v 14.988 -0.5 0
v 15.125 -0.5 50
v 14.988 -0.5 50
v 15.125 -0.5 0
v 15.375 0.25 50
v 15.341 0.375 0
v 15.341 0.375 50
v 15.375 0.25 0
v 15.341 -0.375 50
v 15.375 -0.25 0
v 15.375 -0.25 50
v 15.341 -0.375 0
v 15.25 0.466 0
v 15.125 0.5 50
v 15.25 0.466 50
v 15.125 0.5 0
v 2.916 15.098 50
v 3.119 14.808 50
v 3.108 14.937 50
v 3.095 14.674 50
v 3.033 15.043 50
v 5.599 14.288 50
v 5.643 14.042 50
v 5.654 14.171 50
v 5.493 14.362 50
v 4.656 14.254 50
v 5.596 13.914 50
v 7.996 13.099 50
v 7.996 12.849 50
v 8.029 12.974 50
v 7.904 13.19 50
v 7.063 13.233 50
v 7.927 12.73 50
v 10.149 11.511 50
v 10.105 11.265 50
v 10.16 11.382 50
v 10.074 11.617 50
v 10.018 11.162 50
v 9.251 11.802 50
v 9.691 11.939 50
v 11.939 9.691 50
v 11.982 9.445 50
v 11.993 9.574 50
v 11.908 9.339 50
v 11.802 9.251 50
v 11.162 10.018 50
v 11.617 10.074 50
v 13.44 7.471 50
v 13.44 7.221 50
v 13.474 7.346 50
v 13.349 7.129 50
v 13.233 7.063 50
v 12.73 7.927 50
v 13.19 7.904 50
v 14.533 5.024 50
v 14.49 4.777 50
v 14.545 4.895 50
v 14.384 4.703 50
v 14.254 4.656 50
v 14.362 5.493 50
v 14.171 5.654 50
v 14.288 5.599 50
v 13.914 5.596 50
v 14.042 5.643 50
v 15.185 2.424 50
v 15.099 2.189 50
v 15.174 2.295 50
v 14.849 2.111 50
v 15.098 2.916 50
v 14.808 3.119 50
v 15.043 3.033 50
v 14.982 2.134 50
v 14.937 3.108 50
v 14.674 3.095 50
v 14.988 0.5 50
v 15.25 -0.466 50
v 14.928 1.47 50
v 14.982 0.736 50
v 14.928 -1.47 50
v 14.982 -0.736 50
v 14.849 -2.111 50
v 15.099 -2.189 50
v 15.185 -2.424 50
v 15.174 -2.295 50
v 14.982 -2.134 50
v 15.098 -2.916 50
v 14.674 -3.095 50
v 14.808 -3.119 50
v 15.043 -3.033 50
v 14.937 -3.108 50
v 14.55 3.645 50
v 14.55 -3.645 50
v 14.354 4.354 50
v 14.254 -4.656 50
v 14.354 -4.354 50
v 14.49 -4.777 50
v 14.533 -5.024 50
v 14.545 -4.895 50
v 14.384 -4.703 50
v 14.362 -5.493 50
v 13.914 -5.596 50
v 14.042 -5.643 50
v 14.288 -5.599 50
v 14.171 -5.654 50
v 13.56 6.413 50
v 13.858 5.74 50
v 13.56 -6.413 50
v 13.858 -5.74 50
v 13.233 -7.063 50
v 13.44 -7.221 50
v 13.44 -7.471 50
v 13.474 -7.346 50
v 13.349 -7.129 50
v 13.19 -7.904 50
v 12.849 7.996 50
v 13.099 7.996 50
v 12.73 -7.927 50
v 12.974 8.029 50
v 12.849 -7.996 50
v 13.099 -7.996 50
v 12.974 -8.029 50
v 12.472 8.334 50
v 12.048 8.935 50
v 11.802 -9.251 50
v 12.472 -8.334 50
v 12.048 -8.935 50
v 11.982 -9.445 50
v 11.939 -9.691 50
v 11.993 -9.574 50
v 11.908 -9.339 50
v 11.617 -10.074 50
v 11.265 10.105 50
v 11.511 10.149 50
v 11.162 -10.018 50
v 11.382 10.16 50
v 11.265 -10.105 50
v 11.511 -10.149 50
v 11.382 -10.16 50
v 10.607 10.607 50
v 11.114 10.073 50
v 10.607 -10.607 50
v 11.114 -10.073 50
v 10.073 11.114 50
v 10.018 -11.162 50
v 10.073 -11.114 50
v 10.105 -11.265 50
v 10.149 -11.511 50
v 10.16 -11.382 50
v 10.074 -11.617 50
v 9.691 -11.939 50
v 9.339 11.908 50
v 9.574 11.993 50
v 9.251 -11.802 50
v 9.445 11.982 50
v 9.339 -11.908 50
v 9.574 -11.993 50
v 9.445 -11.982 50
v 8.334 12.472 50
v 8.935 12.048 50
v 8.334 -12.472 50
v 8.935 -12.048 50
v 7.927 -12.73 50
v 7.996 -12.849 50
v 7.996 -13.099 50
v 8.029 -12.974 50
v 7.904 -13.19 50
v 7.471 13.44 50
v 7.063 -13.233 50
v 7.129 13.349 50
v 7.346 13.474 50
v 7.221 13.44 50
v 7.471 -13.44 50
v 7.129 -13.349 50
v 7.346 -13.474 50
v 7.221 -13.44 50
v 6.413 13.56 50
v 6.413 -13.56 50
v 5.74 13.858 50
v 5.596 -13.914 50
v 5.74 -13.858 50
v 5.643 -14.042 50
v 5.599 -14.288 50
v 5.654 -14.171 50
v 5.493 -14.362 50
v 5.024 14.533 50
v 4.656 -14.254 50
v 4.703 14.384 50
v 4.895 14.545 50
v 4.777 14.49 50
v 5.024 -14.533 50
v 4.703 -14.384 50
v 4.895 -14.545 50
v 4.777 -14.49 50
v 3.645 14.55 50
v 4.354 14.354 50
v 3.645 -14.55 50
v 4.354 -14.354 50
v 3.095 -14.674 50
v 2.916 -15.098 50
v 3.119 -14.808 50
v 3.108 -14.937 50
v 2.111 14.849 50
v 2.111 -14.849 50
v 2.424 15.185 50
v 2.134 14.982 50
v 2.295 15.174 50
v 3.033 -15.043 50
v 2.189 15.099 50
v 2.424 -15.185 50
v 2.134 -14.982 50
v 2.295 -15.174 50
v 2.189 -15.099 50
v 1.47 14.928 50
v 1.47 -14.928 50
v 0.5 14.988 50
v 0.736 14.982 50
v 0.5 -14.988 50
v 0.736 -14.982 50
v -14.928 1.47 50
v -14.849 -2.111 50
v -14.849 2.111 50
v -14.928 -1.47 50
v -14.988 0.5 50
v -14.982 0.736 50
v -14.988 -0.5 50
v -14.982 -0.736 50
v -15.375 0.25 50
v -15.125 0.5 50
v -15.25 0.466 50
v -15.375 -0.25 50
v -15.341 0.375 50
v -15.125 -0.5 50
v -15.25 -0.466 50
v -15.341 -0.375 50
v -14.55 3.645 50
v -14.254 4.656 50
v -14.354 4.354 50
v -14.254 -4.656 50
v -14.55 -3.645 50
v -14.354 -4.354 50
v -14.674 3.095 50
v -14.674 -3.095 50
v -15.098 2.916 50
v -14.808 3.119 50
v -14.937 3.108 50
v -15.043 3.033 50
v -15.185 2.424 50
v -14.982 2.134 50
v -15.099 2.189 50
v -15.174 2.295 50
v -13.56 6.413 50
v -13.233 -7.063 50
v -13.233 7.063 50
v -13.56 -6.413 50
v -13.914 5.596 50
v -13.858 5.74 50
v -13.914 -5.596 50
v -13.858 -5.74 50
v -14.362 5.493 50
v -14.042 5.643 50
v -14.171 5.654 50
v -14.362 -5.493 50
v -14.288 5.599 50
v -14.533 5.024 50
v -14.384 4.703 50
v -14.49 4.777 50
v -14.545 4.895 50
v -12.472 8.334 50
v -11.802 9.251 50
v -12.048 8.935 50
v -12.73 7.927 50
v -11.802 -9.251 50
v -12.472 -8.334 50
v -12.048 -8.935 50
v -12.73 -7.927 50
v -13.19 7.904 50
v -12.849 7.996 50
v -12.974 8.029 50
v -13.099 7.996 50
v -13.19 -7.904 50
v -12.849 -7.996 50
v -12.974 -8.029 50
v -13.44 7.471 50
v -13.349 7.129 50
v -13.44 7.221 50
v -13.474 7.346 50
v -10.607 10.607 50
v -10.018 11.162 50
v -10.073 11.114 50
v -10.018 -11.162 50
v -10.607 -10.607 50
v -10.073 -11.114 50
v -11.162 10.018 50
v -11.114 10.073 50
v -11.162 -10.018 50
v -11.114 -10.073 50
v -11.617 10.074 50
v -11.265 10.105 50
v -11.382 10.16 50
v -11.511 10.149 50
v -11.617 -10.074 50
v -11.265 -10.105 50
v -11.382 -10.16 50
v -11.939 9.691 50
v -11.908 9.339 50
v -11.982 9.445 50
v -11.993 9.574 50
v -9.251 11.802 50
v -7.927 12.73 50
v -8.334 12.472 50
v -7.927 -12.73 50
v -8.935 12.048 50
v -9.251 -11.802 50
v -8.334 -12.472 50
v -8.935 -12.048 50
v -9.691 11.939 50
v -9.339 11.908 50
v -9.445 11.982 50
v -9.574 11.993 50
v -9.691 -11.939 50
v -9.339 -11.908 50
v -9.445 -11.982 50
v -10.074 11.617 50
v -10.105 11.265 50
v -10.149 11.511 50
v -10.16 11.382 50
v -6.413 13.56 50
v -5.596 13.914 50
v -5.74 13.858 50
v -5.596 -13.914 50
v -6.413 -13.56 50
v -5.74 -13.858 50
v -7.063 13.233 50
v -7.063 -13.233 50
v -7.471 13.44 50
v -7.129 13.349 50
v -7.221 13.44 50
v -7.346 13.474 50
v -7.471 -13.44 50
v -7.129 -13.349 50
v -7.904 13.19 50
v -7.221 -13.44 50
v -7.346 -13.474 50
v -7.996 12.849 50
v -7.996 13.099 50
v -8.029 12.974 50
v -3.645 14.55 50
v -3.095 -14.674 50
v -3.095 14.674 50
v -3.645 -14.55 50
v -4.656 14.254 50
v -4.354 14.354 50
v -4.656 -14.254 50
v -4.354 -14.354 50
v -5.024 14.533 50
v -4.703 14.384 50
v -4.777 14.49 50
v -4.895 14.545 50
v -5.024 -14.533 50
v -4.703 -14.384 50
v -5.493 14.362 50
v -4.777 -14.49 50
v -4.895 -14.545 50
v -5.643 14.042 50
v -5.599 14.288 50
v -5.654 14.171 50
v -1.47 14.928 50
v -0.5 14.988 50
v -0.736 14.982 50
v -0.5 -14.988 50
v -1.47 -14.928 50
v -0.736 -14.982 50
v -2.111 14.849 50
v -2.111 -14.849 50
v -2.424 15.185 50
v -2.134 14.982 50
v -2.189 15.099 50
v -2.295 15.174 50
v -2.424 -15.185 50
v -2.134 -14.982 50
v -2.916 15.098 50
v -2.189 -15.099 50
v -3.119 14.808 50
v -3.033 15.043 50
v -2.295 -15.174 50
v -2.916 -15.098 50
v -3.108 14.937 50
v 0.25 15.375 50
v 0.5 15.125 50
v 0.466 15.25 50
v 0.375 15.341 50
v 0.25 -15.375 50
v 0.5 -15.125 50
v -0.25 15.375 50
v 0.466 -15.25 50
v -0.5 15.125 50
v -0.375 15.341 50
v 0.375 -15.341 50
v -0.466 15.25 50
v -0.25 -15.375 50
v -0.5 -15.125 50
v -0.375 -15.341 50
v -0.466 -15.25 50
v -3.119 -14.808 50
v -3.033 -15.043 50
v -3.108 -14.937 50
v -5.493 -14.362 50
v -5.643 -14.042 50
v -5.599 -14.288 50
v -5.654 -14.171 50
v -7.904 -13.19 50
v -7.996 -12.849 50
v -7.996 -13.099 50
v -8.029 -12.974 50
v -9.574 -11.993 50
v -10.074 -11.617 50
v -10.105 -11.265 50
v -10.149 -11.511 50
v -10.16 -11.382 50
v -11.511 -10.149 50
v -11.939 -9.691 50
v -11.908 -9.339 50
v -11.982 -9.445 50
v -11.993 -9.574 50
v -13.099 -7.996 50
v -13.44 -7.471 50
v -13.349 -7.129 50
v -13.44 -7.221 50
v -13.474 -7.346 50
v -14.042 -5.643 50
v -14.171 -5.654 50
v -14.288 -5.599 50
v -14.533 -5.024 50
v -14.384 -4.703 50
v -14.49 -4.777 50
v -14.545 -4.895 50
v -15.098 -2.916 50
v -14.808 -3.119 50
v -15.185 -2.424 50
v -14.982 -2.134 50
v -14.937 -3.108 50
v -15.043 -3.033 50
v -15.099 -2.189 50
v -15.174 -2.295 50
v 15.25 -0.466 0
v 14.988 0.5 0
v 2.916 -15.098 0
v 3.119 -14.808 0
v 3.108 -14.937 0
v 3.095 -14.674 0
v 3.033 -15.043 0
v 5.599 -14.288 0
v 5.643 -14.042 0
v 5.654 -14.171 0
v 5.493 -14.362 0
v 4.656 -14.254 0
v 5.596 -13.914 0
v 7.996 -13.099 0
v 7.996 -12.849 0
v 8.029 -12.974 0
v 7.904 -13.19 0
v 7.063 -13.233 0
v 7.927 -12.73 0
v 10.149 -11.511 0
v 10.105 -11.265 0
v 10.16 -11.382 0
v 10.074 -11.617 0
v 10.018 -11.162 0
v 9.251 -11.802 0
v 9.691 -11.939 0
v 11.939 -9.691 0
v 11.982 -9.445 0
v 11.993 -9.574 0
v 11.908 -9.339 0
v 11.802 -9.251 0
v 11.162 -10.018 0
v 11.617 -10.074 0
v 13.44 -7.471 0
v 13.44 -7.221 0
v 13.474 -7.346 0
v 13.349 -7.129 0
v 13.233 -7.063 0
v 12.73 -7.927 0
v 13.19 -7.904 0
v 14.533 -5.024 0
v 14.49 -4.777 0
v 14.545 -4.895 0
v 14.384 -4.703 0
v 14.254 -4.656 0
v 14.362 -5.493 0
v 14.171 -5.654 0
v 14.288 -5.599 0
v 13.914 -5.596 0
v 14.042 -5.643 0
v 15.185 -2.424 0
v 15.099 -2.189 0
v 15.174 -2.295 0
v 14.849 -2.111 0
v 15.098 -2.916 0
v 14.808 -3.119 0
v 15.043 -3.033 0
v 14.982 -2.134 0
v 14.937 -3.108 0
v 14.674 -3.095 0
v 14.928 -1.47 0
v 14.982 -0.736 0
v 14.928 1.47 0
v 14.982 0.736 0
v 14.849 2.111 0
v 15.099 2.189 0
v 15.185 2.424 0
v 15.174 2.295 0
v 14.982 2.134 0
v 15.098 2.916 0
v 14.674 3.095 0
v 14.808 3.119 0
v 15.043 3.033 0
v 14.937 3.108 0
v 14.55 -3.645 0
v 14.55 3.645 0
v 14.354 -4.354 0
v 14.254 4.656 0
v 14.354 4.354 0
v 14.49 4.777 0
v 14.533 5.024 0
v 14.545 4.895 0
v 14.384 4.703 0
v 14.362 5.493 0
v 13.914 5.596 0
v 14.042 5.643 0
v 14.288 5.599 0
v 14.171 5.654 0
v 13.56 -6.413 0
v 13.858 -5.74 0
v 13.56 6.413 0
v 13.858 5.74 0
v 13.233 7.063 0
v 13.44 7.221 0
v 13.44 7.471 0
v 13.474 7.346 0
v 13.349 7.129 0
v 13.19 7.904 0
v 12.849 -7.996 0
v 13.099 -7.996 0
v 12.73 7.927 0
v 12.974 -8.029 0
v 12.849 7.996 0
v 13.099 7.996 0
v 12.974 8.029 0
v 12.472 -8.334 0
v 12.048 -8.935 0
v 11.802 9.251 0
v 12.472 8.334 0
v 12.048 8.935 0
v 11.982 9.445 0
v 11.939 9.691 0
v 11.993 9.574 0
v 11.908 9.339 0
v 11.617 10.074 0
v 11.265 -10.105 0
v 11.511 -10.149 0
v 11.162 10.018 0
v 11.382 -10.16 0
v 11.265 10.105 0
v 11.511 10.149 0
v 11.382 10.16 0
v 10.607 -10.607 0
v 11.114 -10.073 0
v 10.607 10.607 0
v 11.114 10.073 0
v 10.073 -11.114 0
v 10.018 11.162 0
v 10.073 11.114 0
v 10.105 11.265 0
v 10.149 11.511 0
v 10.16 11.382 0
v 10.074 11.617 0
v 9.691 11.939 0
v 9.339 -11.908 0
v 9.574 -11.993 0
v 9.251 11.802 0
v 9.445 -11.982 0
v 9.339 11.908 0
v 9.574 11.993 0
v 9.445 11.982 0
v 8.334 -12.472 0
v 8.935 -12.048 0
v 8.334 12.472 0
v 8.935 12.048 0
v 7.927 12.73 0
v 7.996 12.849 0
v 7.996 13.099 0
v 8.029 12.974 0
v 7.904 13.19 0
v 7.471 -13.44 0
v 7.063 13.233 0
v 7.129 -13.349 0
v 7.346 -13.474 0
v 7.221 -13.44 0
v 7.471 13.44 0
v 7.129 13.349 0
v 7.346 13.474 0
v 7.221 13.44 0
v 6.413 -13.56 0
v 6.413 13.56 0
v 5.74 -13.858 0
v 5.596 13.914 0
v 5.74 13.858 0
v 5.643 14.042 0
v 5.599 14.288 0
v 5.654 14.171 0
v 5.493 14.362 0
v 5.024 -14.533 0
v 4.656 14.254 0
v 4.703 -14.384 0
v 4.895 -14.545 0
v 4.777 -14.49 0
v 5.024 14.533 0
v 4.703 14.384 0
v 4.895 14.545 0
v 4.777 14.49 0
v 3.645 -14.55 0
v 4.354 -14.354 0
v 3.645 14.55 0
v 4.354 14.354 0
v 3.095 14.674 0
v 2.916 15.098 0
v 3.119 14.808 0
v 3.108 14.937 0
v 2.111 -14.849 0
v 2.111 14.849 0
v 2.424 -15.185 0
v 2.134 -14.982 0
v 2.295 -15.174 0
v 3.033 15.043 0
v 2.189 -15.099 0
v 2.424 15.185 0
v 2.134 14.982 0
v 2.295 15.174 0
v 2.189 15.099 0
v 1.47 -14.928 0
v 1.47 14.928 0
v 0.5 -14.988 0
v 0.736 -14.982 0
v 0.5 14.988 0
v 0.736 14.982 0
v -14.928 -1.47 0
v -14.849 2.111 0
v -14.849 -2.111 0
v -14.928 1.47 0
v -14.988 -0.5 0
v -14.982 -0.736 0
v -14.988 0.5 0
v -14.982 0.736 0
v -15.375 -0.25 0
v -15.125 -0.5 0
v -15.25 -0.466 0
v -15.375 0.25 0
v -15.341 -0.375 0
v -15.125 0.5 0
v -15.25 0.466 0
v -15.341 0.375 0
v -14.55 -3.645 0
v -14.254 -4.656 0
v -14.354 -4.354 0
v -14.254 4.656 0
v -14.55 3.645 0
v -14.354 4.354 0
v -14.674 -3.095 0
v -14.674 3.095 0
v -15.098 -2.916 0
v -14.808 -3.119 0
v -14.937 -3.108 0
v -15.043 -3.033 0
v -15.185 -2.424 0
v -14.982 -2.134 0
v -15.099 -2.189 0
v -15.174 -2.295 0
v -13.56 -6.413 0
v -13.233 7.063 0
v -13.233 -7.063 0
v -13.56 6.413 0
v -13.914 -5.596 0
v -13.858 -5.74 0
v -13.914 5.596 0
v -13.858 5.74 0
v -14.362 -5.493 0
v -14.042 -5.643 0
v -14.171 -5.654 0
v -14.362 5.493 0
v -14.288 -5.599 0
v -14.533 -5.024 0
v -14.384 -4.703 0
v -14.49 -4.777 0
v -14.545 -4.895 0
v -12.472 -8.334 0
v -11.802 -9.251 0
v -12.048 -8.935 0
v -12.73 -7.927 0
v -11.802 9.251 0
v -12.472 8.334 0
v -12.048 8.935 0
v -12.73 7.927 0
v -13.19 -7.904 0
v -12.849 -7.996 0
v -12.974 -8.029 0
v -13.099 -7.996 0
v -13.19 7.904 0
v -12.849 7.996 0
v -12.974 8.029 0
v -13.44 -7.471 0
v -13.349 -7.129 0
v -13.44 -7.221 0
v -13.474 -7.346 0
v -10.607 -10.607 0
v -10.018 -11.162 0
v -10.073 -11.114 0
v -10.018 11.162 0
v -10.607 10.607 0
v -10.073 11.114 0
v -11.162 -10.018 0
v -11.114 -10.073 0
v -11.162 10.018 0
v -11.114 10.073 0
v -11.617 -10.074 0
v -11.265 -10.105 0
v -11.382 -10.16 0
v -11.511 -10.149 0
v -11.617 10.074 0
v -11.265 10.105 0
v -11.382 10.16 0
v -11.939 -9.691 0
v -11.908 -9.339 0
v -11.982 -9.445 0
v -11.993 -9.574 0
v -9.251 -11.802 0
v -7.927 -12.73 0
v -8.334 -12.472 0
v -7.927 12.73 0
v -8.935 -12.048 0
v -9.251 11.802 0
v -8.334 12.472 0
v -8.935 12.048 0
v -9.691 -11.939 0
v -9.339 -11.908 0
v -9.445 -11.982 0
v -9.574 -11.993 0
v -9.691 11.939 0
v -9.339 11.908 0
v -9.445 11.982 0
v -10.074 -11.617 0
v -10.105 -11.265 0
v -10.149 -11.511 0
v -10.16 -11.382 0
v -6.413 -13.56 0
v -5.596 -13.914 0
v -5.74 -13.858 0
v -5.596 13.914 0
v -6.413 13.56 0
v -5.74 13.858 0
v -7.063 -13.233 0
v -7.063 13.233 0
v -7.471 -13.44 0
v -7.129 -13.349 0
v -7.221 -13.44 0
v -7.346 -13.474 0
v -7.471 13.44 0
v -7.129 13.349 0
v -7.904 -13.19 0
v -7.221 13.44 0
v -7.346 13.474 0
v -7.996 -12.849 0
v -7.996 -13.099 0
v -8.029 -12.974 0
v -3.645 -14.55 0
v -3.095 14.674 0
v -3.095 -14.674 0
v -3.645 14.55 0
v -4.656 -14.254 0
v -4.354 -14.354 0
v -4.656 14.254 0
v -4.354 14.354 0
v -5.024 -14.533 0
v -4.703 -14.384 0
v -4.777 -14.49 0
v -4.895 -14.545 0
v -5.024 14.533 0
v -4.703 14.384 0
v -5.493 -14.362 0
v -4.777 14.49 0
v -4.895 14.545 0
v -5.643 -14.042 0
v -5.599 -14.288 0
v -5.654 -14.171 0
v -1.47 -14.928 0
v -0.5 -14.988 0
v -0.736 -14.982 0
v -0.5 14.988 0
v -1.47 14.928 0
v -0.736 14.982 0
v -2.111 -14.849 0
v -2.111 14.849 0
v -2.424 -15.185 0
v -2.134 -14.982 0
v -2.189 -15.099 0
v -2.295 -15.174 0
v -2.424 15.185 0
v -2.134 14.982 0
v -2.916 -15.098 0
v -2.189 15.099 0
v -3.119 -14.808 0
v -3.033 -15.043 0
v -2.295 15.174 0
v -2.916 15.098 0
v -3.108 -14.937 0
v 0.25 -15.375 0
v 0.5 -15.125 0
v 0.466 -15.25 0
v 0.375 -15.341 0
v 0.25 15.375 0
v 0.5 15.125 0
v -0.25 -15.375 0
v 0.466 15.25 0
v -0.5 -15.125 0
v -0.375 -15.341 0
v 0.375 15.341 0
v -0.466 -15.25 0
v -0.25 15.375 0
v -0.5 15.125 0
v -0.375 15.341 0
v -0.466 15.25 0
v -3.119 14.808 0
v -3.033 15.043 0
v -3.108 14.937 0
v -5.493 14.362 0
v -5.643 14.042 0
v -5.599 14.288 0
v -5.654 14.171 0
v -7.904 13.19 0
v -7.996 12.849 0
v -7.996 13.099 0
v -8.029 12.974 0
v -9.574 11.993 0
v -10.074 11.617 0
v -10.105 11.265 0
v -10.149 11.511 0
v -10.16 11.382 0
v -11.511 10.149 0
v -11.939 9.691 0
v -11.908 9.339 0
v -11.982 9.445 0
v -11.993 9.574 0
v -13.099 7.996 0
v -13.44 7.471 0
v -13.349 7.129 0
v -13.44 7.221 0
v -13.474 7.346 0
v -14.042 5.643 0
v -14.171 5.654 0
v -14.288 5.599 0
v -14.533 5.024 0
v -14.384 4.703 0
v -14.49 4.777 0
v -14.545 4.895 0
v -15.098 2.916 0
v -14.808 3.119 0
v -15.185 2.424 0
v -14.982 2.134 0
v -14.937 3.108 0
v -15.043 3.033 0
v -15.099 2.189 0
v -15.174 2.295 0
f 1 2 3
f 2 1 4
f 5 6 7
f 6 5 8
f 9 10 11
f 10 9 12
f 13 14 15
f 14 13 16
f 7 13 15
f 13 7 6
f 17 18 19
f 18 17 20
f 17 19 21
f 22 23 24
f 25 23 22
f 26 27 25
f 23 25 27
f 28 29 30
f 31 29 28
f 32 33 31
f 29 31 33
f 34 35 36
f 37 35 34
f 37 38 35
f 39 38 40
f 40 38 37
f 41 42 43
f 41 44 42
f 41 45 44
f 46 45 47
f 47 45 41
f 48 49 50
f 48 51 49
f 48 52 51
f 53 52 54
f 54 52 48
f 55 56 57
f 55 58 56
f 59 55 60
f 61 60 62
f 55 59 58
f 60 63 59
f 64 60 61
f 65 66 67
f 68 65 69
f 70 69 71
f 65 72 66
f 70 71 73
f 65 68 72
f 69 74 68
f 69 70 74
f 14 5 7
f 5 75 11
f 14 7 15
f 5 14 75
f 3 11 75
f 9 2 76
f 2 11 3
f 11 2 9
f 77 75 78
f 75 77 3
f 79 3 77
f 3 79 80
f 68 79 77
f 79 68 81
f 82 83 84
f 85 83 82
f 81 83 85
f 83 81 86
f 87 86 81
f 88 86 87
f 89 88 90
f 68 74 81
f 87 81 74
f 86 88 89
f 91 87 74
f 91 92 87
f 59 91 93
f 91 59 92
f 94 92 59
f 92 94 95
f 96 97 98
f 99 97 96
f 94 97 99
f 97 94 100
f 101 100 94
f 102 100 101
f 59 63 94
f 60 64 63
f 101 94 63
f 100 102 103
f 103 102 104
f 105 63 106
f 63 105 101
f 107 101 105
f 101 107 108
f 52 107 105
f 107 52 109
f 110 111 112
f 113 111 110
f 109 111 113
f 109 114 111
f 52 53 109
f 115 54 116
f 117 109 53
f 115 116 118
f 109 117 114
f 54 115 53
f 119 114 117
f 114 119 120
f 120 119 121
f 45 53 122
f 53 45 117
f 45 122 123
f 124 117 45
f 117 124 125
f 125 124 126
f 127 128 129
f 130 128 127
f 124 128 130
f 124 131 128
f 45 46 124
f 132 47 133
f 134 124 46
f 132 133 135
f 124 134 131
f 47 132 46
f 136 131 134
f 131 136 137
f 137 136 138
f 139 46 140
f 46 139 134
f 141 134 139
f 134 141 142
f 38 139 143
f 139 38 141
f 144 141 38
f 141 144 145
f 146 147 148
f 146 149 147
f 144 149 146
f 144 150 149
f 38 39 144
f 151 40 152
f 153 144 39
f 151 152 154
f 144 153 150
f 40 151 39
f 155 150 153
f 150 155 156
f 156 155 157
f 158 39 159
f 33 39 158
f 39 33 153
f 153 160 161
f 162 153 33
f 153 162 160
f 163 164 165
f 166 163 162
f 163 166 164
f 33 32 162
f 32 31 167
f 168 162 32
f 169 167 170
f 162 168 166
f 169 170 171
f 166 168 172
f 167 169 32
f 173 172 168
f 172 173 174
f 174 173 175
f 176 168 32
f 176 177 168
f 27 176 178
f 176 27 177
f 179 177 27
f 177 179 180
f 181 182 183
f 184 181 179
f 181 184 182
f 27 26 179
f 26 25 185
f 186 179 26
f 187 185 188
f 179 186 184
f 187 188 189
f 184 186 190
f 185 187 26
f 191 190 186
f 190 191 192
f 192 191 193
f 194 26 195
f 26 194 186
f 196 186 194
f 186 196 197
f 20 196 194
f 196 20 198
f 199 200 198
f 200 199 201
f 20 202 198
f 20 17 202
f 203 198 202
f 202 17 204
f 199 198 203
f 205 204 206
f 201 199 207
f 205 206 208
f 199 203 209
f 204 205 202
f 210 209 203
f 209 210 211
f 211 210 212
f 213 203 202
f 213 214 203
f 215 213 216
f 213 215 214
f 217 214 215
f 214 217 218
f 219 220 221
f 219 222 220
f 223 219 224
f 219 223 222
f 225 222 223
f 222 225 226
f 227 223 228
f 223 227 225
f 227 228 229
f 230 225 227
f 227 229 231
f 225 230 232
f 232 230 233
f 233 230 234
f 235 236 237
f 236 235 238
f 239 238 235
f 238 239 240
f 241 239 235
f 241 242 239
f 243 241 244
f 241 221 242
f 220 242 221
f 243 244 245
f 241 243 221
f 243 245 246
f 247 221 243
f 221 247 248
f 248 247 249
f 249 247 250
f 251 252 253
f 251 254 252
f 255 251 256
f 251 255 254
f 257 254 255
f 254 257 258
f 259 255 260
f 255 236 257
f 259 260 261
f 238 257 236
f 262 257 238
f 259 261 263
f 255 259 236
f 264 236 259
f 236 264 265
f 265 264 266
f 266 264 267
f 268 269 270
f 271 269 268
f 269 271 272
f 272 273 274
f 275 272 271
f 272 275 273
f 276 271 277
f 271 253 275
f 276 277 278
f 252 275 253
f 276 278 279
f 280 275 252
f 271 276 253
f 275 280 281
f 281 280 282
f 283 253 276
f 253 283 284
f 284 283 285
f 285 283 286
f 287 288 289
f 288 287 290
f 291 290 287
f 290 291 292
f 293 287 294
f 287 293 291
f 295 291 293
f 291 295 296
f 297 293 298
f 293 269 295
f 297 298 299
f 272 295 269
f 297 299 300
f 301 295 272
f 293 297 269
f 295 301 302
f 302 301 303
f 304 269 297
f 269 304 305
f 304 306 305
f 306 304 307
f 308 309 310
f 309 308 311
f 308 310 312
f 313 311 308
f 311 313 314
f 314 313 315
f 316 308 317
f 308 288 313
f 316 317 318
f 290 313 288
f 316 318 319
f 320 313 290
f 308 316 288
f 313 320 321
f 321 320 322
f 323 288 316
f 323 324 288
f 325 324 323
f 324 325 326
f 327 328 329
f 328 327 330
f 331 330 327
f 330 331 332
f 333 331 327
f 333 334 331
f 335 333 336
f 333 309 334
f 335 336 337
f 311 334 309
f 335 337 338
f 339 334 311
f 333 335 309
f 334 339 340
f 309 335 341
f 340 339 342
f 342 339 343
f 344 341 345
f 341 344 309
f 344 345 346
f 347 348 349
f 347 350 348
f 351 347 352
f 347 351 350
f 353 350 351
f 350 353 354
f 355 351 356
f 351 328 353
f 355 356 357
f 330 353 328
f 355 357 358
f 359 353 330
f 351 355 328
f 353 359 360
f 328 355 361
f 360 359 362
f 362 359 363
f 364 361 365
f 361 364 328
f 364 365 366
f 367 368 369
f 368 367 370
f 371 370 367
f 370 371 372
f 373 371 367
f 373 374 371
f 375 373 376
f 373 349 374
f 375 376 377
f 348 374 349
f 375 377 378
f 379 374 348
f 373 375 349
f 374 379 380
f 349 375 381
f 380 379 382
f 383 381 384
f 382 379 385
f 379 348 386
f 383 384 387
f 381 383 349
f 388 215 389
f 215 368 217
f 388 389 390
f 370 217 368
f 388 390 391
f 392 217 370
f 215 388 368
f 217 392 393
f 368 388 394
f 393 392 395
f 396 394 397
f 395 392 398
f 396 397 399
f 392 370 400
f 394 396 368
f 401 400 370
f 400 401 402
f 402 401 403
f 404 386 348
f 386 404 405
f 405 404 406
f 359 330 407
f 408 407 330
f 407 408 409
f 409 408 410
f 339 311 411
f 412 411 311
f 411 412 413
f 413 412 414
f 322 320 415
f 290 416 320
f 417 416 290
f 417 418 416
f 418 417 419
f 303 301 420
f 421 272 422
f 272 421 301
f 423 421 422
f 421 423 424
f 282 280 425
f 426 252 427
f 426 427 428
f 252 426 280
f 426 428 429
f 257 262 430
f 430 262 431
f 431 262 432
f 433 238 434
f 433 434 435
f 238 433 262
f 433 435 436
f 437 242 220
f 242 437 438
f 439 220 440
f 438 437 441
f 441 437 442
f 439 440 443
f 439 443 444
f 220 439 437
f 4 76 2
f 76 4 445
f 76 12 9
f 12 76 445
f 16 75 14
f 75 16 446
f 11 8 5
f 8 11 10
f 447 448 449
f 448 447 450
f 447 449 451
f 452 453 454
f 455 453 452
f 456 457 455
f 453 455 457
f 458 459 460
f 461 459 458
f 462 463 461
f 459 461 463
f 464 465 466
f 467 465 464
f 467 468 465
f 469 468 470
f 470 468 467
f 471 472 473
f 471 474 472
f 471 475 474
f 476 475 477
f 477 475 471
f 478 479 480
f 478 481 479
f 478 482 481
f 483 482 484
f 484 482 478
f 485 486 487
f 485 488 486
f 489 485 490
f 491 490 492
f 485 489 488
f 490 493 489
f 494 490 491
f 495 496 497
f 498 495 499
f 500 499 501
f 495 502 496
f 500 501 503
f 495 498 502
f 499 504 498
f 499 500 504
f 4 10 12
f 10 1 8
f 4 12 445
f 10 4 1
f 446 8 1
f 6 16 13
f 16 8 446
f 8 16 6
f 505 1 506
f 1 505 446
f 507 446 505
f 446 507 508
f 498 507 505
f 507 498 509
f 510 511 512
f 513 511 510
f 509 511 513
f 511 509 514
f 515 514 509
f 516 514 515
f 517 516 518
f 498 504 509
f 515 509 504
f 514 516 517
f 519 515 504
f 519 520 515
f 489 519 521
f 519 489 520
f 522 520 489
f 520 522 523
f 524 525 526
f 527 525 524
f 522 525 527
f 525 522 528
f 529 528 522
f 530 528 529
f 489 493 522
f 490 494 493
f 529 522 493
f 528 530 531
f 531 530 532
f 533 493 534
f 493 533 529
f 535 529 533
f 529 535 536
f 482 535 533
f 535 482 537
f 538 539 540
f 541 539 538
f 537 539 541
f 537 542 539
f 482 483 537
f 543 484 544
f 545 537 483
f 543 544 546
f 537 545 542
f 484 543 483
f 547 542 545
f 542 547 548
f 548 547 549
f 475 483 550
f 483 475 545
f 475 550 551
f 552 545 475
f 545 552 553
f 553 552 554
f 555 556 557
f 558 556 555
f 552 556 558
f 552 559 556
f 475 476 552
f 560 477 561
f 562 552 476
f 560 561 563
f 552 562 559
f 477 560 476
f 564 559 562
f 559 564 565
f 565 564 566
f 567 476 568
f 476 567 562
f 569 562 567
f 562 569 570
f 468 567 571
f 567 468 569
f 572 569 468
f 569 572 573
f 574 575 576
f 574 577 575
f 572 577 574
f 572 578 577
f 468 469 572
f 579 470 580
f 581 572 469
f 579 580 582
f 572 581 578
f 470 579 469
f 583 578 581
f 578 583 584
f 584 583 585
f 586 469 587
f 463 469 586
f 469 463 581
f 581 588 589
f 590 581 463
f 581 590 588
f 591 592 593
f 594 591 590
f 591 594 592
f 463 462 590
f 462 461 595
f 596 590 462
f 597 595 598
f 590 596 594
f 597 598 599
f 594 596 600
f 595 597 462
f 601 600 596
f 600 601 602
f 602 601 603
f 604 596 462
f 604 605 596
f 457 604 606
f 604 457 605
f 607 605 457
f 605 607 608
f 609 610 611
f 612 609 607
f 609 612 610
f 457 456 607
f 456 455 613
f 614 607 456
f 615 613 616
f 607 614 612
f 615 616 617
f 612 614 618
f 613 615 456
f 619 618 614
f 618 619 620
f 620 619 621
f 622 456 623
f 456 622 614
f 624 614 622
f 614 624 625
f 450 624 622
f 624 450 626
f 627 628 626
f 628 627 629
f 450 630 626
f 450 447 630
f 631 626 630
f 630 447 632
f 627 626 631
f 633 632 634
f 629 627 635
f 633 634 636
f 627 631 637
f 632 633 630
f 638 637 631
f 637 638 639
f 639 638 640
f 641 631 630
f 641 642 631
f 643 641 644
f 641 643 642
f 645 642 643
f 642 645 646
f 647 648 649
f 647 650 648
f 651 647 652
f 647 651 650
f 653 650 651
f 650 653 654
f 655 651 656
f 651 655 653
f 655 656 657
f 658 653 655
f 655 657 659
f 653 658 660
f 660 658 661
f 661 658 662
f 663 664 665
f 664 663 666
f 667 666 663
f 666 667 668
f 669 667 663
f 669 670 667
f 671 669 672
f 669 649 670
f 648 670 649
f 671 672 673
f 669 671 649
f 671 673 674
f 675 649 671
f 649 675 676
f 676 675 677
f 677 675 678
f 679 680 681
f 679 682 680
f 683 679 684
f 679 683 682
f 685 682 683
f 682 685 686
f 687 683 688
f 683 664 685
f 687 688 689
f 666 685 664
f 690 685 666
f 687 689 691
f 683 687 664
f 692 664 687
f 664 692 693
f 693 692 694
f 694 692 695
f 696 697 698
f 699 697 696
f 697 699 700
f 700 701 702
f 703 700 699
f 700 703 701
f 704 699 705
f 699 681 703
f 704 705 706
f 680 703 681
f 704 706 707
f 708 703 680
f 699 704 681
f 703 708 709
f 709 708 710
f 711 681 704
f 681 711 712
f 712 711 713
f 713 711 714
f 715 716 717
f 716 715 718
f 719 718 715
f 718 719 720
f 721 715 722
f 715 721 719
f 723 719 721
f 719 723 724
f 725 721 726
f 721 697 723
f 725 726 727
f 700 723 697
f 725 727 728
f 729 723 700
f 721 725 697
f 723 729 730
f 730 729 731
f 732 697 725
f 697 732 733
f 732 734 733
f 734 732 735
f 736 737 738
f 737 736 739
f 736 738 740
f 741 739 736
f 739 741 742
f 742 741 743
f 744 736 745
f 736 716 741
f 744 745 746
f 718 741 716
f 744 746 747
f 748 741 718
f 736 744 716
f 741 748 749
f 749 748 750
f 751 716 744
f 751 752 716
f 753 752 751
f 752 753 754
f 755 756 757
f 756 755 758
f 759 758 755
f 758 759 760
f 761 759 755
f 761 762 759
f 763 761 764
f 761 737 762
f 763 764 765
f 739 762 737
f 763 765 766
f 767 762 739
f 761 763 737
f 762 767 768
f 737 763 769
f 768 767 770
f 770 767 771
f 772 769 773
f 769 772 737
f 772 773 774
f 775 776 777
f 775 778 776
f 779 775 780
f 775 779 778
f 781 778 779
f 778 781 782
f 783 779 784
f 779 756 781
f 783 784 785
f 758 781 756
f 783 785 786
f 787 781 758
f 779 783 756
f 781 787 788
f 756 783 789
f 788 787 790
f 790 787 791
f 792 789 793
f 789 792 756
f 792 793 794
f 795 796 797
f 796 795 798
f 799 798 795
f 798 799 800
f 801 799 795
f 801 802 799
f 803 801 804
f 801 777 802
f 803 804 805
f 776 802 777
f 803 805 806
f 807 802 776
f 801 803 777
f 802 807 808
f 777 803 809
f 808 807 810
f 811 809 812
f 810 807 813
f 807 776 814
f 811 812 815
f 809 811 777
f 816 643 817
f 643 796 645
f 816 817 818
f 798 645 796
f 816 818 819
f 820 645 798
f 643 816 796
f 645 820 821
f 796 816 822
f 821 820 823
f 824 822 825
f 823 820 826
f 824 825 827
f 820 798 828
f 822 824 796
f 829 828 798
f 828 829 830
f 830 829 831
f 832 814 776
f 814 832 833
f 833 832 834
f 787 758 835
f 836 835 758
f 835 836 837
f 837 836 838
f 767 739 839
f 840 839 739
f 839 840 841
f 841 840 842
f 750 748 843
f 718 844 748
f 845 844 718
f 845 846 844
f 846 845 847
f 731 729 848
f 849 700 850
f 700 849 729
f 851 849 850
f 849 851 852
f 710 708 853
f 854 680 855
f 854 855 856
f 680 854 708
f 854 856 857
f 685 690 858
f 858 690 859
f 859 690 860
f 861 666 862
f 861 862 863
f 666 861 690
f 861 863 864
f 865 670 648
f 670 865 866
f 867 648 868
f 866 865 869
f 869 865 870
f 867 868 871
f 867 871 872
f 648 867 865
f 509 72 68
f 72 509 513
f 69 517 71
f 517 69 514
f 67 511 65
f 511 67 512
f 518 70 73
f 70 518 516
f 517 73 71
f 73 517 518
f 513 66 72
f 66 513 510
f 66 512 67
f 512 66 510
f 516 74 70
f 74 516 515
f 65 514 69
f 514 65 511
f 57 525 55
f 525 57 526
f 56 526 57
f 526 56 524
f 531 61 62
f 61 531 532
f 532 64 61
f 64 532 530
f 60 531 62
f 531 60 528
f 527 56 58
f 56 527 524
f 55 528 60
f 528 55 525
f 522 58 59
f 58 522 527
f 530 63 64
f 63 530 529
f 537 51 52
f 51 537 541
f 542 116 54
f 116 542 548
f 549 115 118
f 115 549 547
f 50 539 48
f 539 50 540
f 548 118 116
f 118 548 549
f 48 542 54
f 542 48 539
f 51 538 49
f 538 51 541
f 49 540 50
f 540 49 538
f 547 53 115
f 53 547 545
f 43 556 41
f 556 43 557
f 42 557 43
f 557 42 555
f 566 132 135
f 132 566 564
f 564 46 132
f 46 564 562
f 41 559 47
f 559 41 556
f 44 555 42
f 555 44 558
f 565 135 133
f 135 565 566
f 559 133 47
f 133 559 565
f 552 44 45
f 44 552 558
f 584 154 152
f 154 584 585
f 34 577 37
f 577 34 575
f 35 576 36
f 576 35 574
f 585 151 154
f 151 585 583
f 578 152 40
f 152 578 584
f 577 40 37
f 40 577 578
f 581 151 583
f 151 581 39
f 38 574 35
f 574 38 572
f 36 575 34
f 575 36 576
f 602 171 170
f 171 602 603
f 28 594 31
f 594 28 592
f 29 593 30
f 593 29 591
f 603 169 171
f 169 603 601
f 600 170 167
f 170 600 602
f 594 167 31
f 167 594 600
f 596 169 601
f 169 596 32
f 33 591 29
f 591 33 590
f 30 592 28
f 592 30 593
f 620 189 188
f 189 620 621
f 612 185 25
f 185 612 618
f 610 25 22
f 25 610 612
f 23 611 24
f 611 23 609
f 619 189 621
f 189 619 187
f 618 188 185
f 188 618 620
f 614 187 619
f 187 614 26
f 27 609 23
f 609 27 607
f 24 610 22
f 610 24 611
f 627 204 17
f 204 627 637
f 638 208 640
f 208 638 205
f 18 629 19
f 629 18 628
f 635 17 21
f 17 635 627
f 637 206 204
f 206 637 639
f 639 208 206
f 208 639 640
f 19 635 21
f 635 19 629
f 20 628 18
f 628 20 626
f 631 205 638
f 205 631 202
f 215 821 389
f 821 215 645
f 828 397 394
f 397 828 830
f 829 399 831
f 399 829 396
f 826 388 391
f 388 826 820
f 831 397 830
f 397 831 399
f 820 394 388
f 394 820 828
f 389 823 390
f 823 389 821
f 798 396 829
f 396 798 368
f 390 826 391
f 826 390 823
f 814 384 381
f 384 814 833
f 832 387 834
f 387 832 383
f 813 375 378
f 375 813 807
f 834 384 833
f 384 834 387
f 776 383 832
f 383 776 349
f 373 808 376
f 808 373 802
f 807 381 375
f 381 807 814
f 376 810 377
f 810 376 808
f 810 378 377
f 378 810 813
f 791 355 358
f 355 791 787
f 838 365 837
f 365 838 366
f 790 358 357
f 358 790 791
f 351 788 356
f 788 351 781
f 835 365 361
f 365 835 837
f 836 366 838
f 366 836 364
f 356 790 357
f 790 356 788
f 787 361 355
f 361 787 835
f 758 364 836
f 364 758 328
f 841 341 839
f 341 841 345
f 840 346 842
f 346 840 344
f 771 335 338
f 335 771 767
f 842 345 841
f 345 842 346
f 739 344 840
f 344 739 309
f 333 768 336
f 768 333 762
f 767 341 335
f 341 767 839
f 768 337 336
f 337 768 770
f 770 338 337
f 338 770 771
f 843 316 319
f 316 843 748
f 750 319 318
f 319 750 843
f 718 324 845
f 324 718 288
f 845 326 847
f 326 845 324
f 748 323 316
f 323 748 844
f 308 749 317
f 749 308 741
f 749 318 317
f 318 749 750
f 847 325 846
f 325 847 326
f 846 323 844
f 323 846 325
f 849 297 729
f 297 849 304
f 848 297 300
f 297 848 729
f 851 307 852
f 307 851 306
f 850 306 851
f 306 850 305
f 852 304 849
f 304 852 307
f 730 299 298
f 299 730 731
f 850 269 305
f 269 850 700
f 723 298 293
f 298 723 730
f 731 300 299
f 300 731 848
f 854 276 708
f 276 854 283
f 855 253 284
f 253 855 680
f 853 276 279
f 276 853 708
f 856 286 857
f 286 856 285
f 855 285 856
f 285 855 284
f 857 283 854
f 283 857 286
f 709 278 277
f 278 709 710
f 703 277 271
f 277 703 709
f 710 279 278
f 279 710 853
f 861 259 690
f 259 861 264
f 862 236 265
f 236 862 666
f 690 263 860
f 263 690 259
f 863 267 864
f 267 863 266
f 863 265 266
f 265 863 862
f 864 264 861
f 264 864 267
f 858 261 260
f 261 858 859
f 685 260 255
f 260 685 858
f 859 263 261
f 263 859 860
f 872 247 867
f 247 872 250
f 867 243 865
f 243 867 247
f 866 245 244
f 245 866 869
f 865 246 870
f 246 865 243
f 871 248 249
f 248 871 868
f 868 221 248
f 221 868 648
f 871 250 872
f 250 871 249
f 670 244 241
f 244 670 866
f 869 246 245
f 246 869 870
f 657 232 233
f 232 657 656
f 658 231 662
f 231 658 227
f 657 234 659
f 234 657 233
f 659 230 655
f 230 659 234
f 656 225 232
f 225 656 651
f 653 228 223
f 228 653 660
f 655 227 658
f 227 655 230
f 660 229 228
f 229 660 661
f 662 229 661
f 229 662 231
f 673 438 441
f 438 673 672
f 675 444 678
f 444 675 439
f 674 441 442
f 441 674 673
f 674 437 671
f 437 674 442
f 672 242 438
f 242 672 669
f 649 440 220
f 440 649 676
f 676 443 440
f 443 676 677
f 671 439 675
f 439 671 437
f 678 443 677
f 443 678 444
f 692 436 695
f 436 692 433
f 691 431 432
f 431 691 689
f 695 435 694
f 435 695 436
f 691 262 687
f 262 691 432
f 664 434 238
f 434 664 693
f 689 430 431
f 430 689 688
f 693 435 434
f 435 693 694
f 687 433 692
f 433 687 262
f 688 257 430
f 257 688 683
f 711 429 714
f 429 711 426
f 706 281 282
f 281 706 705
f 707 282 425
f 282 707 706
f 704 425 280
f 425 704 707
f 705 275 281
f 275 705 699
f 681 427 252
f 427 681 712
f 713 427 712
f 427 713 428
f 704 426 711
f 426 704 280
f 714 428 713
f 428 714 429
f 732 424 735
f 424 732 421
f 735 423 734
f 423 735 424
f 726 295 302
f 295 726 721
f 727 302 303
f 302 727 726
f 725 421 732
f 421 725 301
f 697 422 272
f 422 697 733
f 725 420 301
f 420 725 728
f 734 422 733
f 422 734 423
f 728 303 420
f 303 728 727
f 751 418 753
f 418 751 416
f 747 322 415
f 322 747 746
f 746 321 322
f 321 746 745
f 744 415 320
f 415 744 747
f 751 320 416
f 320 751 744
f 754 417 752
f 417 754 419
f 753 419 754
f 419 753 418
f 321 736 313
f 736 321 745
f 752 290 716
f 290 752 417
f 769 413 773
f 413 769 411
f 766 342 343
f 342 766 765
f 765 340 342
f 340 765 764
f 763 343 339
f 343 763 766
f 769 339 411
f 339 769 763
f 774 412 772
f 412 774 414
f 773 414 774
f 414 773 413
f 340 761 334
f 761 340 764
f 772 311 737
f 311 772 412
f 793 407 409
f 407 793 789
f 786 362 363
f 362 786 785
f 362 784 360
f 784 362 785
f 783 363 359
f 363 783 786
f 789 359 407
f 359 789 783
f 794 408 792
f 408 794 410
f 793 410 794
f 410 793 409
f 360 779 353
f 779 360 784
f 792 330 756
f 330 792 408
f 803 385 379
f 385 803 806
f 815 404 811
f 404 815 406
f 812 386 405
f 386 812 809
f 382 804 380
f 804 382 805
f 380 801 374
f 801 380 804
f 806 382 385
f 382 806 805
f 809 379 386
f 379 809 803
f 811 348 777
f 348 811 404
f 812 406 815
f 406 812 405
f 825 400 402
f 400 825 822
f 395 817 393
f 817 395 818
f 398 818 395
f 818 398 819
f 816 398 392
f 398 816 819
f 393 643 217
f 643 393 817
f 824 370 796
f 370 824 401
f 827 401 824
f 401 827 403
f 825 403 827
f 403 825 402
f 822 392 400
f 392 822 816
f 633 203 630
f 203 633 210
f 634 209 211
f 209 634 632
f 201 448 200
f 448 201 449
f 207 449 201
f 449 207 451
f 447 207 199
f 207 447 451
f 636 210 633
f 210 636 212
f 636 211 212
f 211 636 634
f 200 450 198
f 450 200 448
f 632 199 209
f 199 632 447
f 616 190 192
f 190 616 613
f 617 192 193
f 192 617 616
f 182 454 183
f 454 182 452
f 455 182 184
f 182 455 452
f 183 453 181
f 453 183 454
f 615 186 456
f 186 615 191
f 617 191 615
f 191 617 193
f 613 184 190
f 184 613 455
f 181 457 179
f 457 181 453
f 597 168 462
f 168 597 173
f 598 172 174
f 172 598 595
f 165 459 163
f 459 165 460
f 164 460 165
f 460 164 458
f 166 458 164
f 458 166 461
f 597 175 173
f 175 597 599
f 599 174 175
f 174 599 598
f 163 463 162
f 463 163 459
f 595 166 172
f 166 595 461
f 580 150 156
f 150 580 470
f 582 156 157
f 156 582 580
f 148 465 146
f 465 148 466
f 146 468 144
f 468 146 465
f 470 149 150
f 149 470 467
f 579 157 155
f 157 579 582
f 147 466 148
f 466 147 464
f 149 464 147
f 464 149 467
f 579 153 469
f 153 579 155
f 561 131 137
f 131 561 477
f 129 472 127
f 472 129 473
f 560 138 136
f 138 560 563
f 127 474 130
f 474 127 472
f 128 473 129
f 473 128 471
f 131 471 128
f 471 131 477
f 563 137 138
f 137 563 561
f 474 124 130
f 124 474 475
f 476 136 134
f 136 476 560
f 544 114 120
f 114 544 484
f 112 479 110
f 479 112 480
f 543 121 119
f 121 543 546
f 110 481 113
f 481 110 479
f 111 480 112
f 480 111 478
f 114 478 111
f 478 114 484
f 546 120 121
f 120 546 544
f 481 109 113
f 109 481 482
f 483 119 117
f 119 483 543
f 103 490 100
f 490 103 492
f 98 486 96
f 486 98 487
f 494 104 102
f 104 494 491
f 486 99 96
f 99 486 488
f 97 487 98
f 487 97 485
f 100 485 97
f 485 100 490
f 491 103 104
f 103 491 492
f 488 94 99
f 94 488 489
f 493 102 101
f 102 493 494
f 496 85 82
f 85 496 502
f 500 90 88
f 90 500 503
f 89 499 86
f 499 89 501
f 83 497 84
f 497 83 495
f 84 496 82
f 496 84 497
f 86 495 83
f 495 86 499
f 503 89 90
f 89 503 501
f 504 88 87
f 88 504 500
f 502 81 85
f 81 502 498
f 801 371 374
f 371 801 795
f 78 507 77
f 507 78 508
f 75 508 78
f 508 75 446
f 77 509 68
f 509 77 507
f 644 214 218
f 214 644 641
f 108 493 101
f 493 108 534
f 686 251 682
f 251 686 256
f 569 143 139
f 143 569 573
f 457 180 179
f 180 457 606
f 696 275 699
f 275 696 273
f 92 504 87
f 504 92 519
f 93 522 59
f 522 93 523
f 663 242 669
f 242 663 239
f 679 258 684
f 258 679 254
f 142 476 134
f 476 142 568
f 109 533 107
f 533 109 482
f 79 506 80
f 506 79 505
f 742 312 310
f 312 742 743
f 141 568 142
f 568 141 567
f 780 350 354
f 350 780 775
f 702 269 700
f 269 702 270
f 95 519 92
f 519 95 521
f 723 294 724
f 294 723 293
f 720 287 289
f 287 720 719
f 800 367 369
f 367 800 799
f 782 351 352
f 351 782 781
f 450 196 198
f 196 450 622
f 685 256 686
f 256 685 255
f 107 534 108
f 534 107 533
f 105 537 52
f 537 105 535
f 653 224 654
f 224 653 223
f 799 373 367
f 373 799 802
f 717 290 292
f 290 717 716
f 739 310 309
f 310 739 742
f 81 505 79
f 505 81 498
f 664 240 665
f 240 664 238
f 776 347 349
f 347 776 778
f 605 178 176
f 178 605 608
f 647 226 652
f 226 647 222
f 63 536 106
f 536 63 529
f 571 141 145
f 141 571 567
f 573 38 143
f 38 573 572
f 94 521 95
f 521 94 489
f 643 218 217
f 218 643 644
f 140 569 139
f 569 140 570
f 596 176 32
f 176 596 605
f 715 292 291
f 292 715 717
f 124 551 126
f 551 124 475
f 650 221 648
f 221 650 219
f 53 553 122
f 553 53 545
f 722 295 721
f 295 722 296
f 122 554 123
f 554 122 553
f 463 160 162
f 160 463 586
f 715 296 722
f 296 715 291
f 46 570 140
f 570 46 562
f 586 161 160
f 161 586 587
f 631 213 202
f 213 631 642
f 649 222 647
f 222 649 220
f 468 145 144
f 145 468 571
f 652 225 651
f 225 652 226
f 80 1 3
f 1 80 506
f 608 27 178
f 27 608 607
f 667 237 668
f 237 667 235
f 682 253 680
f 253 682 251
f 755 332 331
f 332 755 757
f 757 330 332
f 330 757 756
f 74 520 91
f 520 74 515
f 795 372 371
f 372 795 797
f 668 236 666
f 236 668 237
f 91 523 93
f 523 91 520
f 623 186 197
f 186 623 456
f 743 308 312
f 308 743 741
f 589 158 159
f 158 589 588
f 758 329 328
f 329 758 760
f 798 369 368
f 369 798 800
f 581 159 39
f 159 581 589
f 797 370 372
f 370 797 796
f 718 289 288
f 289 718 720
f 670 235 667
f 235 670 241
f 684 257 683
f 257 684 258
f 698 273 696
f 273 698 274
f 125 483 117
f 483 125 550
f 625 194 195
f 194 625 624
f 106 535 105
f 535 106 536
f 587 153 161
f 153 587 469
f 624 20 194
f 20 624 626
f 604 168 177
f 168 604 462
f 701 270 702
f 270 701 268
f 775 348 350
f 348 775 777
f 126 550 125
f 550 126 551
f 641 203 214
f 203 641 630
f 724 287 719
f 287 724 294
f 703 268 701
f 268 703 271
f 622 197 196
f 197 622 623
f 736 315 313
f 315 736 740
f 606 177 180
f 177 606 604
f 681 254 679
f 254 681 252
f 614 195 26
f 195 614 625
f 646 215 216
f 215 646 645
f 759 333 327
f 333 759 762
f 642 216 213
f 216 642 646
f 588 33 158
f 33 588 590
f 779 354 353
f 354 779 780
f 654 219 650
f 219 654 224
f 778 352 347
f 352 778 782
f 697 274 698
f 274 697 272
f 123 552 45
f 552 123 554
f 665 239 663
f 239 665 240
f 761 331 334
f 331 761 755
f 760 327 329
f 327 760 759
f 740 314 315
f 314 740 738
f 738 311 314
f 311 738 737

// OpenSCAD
// Cylindrical grip with evenly spaced vertical ribs.
//$preview = true;
$fa = $preview ? 16 : 1;
$fs = $preview ? 3 : 0.15;

height = 50;
radius = 15;
base_fn = $preview ? 64 : 128;
rib_count = 36;
rib_width = 1;
rib_height = .75;
rib_corner_radius = 0.25;

module rounded_rib() {
    translate([radius, 0, 0])
        linear_extrude(height = height)
        minkowski() {
            square([
                rib_height - 2 * rib_corner_radius,
                rib_width - 2 * rib_corner_radius
            ], center = true);
            circle(r = rib_corner_radius, $fn = 12);
        }
}

module ribbing() {
    for (rib = [0 : rib_count - 1])
        rotate([0, 0, rib * 360 / rib_count])
            rounded_rib();
}

module ribbed_cylinder() {
    union() {
        cylinder(r = radius, h = height, $fn = base_fn);
        ribbing();
    }
}

ribbed_cylinder();
